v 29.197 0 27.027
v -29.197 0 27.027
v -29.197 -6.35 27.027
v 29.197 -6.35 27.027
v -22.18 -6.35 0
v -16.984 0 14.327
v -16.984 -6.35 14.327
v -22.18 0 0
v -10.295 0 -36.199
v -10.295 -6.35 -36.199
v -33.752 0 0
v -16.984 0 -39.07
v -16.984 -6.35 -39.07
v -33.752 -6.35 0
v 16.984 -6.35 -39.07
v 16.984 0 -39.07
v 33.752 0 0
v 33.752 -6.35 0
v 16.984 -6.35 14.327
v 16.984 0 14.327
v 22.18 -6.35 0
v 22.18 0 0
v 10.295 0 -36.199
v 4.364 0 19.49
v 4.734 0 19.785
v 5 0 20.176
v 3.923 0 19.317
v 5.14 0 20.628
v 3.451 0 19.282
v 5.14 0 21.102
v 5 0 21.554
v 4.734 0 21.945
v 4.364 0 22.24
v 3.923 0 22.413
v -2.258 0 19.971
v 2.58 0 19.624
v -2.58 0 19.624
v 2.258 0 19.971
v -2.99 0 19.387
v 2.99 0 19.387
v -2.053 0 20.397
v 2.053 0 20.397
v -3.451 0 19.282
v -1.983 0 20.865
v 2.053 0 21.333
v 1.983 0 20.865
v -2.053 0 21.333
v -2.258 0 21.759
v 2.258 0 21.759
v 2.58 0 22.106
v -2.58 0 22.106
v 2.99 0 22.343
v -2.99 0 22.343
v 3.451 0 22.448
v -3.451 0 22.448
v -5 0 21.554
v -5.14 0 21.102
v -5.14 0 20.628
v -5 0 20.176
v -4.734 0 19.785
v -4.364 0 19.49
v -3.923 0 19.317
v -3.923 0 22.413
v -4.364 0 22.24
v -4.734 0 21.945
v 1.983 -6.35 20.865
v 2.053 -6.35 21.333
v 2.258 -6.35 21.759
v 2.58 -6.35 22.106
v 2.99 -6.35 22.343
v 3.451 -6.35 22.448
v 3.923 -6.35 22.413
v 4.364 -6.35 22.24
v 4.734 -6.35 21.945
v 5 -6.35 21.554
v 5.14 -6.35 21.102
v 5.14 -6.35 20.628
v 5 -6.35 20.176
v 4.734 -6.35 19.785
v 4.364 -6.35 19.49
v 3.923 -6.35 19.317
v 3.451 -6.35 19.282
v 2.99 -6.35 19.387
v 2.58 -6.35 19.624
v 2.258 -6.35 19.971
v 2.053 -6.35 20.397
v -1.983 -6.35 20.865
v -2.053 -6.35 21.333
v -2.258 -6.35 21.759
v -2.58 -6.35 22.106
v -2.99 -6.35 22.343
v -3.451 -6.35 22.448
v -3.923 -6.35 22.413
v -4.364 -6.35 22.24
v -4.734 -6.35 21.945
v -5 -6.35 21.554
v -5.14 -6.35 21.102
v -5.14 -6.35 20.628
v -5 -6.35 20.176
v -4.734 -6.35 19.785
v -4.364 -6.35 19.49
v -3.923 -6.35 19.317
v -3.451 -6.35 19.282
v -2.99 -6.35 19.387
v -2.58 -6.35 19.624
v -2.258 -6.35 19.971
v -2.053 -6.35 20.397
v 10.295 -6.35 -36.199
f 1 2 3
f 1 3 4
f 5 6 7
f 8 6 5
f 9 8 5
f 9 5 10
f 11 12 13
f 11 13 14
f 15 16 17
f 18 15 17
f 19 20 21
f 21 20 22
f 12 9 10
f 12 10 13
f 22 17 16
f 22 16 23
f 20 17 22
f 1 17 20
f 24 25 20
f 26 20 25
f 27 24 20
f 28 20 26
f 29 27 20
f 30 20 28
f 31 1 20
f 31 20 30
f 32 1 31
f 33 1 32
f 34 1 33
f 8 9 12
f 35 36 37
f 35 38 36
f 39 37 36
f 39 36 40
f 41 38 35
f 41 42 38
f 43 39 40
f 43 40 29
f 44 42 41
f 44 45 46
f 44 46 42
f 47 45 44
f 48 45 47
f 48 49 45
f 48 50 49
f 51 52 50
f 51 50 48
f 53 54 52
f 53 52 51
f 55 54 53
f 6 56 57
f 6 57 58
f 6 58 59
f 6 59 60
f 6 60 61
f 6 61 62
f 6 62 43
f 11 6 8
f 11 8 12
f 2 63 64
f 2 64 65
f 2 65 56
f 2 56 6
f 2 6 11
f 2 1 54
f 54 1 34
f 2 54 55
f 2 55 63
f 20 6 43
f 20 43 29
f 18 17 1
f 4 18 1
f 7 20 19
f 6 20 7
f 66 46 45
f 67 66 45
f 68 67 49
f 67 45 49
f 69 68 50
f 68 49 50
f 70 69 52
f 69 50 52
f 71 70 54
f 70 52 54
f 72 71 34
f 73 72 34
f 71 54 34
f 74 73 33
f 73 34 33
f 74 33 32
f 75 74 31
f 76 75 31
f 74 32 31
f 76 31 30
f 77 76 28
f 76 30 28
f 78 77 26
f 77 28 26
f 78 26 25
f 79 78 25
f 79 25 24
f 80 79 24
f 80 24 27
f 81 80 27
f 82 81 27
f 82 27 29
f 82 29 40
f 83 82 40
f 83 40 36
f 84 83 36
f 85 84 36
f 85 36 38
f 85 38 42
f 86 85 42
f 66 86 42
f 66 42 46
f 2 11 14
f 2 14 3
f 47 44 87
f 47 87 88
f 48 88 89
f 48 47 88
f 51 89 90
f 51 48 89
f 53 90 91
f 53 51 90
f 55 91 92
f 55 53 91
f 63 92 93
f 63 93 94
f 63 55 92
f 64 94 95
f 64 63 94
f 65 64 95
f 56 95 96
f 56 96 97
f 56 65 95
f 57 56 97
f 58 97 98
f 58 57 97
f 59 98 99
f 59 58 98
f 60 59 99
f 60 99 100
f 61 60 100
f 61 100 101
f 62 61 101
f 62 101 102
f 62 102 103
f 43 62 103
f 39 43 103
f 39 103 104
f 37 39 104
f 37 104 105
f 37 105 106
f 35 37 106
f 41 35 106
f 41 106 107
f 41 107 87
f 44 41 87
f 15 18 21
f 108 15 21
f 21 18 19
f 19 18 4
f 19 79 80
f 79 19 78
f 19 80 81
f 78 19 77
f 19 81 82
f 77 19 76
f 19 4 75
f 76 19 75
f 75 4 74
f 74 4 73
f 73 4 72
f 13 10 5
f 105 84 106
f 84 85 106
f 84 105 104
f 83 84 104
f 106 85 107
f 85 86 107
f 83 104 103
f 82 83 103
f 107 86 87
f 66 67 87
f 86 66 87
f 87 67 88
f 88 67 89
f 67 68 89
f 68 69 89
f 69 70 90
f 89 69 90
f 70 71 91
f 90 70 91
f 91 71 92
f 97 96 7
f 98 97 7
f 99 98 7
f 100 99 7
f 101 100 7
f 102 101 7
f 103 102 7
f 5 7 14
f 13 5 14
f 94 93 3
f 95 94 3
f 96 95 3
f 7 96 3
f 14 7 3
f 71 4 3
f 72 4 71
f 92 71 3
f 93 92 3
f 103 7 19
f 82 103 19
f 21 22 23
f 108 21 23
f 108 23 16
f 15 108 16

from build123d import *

# Parameters (mm, degrees)
F1_DEPTH = 6.35
F3_D     = 3.175


with BuildPart() as f1:
    # F0 (on Front) → F1 (new body)
    with BuildSketch(Plane.XZ):
        Polygon((29.197415, 27.026769), (0, 27.026769), (0, 14.326769), (16.983994, 14.326769), (22.180271, 0), (10.29463, -36.19864), (16.983994, -39.069609), (33.752048, 0), align=None)
    extrude(amount=F1_DEPTH)

    # F3 (through all)
    with Locations(Plane.XZ.offset(6.35)):
        with Locations((3.570083, 20.865042)):
            Hole(F3_D / 2)

    # F4: F1 across plane


with BuildPart() as f1_1:
    add(f1.part)
    add(f1.part.mirror(Plane.YZ))


solid = f1_1.part
